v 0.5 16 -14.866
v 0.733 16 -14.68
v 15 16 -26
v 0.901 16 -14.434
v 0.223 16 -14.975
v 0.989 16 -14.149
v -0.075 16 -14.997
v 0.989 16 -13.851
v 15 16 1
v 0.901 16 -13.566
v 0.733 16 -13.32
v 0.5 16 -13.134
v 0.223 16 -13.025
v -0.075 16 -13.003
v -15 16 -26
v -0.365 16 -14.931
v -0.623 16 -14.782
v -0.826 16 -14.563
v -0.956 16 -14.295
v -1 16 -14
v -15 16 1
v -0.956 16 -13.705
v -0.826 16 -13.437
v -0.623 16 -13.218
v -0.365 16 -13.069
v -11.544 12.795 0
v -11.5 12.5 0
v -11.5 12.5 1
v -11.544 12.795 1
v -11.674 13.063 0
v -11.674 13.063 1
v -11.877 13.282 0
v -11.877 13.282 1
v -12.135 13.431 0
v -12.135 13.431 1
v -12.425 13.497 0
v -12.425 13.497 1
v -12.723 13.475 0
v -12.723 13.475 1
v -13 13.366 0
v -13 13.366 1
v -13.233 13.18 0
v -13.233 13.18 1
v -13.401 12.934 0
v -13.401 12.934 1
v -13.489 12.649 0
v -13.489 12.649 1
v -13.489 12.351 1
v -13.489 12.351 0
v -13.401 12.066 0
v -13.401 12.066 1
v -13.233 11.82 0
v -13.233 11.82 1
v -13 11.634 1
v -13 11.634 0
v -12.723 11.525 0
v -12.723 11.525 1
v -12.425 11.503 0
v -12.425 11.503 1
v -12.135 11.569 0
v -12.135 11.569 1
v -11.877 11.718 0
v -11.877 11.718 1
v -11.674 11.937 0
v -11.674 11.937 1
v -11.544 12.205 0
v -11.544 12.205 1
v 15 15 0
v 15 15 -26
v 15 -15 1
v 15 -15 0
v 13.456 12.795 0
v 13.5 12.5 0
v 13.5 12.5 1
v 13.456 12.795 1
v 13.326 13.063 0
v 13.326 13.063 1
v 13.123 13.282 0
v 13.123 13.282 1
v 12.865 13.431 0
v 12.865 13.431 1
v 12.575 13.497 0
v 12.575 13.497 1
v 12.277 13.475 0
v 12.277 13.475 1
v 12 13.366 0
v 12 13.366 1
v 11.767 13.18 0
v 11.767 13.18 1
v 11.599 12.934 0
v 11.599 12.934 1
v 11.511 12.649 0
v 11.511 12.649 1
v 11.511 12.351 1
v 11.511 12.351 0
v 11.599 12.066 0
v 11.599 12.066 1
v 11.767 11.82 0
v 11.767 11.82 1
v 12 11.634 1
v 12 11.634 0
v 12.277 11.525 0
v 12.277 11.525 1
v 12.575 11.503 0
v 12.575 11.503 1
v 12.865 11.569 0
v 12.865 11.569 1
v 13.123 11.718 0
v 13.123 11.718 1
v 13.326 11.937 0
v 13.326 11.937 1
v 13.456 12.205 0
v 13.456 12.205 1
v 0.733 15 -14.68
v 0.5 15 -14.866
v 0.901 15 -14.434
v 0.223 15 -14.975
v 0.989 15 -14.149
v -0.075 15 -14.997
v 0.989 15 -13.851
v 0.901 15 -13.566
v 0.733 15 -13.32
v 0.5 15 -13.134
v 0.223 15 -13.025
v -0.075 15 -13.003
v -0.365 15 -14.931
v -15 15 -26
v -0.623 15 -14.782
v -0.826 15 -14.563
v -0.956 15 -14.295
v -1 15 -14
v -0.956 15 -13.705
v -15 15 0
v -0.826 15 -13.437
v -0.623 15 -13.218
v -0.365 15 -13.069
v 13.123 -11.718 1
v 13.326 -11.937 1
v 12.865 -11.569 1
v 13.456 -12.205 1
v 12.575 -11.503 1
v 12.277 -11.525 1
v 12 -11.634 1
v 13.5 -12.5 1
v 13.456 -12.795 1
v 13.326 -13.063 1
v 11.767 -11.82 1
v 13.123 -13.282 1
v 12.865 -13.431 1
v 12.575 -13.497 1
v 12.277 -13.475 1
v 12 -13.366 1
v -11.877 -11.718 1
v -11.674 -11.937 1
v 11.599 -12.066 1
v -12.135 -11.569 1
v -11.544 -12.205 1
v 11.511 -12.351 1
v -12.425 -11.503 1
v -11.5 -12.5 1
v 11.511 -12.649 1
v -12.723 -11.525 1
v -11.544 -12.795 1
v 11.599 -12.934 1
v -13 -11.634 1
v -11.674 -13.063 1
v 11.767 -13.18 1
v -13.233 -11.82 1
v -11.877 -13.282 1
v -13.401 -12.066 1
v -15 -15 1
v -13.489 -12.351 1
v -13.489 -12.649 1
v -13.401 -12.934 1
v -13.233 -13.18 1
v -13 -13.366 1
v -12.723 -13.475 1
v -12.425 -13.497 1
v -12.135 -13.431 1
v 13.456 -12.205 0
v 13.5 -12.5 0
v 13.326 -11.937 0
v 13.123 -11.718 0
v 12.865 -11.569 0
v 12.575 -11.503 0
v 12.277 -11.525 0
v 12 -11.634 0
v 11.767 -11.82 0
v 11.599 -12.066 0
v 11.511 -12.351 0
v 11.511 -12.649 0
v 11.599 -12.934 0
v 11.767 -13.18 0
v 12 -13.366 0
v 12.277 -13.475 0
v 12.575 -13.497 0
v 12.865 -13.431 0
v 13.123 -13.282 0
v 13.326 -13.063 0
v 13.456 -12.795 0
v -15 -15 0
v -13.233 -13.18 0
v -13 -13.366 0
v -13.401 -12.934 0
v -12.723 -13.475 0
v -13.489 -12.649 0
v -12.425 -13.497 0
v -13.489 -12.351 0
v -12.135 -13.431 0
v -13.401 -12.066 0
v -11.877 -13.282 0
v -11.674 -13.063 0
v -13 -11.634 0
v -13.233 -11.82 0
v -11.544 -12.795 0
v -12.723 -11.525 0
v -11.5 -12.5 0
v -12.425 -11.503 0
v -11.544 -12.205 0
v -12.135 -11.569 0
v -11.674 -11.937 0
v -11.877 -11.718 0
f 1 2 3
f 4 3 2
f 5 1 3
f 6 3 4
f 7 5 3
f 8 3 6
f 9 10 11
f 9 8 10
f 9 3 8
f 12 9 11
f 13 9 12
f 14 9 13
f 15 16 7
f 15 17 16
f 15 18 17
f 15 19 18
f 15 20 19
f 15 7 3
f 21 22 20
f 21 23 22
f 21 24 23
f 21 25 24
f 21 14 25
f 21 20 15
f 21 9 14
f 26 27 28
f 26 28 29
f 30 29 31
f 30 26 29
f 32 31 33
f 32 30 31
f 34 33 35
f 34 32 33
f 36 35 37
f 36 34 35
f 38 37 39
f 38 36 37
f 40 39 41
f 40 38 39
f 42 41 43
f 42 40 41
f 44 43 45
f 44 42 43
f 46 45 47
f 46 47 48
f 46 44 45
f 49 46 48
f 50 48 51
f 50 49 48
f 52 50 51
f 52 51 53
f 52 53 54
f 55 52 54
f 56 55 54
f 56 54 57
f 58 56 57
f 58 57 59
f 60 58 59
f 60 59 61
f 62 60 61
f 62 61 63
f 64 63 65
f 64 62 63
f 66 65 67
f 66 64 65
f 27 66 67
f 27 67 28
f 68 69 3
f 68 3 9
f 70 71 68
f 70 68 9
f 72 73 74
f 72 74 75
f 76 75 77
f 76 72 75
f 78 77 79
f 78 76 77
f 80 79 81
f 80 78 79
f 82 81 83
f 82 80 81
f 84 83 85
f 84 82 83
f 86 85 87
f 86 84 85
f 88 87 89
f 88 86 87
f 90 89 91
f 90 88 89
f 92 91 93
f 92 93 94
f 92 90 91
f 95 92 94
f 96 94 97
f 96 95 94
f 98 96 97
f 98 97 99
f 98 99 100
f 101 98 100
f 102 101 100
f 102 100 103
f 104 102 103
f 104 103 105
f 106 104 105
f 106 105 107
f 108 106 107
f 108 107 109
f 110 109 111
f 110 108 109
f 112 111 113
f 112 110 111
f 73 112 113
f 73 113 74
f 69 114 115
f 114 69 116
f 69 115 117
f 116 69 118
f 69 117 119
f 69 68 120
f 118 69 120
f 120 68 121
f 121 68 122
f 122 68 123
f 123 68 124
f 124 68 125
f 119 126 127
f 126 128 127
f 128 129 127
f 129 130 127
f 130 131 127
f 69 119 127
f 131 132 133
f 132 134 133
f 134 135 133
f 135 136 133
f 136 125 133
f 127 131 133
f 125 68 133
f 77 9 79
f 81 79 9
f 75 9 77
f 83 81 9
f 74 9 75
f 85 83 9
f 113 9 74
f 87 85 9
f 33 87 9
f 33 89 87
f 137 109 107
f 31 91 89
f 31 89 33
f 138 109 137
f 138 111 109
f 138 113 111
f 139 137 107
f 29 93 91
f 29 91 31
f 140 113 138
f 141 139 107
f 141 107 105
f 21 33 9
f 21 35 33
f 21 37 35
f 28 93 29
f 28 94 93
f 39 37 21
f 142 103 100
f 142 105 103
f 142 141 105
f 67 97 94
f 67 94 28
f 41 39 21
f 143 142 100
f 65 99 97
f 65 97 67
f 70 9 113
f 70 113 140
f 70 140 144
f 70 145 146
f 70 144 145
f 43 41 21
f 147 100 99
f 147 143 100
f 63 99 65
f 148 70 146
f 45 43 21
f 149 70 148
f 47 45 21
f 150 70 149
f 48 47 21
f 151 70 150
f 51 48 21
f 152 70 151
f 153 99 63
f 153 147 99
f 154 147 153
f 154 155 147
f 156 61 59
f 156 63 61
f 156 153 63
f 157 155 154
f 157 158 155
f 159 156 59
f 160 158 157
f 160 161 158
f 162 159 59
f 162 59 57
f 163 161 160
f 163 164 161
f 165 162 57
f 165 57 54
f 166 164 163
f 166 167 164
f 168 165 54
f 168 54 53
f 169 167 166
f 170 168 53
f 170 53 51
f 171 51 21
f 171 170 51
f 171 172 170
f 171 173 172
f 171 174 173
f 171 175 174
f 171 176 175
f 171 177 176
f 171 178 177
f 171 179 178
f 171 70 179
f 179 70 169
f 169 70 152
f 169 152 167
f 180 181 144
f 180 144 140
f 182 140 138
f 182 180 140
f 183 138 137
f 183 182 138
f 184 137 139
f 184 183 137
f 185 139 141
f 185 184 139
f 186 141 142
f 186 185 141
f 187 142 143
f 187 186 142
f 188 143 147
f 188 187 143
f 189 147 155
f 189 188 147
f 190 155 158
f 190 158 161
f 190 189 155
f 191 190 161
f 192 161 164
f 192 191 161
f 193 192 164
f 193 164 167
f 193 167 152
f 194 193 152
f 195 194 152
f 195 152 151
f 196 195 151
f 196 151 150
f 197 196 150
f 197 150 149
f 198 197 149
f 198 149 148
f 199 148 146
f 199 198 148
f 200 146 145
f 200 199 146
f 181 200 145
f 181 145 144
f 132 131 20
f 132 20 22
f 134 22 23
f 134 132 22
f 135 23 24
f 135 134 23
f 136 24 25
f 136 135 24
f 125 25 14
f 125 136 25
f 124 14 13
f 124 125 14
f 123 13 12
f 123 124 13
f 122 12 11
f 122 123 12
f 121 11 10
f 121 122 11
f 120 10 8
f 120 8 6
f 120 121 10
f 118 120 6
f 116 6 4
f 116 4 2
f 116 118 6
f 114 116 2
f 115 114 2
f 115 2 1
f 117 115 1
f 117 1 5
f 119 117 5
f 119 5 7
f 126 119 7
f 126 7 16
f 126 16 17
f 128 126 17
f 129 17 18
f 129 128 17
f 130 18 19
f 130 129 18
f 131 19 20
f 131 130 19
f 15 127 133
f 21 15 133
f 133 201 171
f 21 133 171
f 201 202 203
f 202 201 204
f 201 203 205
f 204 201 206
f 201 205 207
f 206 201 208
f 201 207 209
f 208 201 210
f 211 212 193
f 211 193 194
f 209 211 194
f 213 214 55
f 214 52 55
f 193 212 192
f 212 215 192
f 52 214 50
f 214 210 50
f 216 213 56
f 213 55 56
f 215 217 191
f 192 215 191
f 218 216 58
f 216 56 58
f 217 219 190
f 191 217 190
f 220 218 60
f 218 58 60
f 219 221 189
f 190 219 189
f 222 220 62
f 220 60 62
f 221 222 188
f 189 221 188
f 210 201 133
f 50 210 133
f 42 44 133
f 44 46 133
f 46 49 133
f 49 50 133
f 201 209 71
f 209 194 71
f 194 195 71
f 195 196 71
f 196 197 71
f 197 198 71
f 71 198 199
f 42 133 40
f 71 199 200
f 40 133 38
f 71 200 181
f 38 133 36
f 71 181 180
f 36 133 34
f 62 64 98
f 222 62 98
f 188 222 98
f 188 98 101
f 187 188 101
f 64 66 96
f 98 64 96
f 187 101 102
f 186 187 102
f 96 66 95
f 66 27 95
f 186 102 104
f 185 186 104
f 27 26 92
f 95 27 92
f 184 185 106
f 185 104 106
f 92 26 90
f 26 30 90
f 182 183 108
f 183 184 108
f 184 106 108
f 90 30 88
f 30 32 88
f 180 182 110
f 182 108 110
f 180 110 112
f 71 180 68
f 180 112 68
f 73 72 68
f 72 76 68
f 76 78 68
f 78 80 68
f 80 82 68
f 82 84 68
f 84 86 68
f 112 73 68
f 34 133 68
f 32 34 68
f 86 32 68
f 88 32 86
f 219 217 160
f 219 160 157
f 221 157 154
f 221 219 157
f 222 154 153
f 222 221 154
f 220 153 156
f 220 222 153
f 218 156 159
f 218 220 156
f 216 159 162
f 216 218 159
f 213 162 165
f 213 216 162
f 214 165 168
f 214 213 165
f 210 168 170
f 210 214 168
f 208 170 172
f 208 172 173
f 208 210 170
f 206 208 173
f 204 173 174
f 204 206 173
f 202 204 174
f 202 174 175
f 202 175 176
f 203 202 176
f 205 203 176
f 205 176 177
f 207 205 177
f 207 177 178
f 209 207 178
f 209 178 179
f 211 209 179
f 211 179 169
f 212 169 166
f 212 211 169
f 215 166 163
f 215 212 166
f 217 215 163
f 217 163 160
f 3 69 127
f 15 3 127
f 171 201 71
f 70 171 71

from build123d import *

# Parameters (mm, degrees)
F0_W     = 30
F0_H     = 30
F0_R     = 1
F1_DEPTH = 1
F2_W     = 30
F2_H     = 27
F2_R     = 1
F3_DEPTH = 1


with BuildPart() as f1:
    # F0 (on Top) → F1 (new body)
    with BuildSketch(Plane.XY):
        Rectangle(F0_W, F0_H)
        with Locations((-12.5, -12.5)):
            Circle(F0_R, mode=Mode.SUBTRACT)
        with Locations((12.5, -12.5)):
            Circle(F0_R, mode=Mode.SUBTRACT)
        with Locations((-12.5, 12.5)):
            Circle(F0_R, mode=Mode.SUBTRACT)
        with Locations((12.5, 12.5)):
            Circle(F0_R, mode=Mode.SUBTRACT)
    extrude(amount=F1_DEPTH)

    # F2 (on face) → F3 (join)
    with BuildSketch(Plane(origin=(0, 15, 0), x_dir=(-1, 0, 0), z_dir=(0, 1, 0))):
        with Locations((0, -12.5)):
            Rectangle(F2_W, F2_H)
        with Locations((0, -14)):
            Circle(F2_R, mode=Mode.SUBTRACT)
    extrude(amount=F3_DEPTH)


solid = f1.part
